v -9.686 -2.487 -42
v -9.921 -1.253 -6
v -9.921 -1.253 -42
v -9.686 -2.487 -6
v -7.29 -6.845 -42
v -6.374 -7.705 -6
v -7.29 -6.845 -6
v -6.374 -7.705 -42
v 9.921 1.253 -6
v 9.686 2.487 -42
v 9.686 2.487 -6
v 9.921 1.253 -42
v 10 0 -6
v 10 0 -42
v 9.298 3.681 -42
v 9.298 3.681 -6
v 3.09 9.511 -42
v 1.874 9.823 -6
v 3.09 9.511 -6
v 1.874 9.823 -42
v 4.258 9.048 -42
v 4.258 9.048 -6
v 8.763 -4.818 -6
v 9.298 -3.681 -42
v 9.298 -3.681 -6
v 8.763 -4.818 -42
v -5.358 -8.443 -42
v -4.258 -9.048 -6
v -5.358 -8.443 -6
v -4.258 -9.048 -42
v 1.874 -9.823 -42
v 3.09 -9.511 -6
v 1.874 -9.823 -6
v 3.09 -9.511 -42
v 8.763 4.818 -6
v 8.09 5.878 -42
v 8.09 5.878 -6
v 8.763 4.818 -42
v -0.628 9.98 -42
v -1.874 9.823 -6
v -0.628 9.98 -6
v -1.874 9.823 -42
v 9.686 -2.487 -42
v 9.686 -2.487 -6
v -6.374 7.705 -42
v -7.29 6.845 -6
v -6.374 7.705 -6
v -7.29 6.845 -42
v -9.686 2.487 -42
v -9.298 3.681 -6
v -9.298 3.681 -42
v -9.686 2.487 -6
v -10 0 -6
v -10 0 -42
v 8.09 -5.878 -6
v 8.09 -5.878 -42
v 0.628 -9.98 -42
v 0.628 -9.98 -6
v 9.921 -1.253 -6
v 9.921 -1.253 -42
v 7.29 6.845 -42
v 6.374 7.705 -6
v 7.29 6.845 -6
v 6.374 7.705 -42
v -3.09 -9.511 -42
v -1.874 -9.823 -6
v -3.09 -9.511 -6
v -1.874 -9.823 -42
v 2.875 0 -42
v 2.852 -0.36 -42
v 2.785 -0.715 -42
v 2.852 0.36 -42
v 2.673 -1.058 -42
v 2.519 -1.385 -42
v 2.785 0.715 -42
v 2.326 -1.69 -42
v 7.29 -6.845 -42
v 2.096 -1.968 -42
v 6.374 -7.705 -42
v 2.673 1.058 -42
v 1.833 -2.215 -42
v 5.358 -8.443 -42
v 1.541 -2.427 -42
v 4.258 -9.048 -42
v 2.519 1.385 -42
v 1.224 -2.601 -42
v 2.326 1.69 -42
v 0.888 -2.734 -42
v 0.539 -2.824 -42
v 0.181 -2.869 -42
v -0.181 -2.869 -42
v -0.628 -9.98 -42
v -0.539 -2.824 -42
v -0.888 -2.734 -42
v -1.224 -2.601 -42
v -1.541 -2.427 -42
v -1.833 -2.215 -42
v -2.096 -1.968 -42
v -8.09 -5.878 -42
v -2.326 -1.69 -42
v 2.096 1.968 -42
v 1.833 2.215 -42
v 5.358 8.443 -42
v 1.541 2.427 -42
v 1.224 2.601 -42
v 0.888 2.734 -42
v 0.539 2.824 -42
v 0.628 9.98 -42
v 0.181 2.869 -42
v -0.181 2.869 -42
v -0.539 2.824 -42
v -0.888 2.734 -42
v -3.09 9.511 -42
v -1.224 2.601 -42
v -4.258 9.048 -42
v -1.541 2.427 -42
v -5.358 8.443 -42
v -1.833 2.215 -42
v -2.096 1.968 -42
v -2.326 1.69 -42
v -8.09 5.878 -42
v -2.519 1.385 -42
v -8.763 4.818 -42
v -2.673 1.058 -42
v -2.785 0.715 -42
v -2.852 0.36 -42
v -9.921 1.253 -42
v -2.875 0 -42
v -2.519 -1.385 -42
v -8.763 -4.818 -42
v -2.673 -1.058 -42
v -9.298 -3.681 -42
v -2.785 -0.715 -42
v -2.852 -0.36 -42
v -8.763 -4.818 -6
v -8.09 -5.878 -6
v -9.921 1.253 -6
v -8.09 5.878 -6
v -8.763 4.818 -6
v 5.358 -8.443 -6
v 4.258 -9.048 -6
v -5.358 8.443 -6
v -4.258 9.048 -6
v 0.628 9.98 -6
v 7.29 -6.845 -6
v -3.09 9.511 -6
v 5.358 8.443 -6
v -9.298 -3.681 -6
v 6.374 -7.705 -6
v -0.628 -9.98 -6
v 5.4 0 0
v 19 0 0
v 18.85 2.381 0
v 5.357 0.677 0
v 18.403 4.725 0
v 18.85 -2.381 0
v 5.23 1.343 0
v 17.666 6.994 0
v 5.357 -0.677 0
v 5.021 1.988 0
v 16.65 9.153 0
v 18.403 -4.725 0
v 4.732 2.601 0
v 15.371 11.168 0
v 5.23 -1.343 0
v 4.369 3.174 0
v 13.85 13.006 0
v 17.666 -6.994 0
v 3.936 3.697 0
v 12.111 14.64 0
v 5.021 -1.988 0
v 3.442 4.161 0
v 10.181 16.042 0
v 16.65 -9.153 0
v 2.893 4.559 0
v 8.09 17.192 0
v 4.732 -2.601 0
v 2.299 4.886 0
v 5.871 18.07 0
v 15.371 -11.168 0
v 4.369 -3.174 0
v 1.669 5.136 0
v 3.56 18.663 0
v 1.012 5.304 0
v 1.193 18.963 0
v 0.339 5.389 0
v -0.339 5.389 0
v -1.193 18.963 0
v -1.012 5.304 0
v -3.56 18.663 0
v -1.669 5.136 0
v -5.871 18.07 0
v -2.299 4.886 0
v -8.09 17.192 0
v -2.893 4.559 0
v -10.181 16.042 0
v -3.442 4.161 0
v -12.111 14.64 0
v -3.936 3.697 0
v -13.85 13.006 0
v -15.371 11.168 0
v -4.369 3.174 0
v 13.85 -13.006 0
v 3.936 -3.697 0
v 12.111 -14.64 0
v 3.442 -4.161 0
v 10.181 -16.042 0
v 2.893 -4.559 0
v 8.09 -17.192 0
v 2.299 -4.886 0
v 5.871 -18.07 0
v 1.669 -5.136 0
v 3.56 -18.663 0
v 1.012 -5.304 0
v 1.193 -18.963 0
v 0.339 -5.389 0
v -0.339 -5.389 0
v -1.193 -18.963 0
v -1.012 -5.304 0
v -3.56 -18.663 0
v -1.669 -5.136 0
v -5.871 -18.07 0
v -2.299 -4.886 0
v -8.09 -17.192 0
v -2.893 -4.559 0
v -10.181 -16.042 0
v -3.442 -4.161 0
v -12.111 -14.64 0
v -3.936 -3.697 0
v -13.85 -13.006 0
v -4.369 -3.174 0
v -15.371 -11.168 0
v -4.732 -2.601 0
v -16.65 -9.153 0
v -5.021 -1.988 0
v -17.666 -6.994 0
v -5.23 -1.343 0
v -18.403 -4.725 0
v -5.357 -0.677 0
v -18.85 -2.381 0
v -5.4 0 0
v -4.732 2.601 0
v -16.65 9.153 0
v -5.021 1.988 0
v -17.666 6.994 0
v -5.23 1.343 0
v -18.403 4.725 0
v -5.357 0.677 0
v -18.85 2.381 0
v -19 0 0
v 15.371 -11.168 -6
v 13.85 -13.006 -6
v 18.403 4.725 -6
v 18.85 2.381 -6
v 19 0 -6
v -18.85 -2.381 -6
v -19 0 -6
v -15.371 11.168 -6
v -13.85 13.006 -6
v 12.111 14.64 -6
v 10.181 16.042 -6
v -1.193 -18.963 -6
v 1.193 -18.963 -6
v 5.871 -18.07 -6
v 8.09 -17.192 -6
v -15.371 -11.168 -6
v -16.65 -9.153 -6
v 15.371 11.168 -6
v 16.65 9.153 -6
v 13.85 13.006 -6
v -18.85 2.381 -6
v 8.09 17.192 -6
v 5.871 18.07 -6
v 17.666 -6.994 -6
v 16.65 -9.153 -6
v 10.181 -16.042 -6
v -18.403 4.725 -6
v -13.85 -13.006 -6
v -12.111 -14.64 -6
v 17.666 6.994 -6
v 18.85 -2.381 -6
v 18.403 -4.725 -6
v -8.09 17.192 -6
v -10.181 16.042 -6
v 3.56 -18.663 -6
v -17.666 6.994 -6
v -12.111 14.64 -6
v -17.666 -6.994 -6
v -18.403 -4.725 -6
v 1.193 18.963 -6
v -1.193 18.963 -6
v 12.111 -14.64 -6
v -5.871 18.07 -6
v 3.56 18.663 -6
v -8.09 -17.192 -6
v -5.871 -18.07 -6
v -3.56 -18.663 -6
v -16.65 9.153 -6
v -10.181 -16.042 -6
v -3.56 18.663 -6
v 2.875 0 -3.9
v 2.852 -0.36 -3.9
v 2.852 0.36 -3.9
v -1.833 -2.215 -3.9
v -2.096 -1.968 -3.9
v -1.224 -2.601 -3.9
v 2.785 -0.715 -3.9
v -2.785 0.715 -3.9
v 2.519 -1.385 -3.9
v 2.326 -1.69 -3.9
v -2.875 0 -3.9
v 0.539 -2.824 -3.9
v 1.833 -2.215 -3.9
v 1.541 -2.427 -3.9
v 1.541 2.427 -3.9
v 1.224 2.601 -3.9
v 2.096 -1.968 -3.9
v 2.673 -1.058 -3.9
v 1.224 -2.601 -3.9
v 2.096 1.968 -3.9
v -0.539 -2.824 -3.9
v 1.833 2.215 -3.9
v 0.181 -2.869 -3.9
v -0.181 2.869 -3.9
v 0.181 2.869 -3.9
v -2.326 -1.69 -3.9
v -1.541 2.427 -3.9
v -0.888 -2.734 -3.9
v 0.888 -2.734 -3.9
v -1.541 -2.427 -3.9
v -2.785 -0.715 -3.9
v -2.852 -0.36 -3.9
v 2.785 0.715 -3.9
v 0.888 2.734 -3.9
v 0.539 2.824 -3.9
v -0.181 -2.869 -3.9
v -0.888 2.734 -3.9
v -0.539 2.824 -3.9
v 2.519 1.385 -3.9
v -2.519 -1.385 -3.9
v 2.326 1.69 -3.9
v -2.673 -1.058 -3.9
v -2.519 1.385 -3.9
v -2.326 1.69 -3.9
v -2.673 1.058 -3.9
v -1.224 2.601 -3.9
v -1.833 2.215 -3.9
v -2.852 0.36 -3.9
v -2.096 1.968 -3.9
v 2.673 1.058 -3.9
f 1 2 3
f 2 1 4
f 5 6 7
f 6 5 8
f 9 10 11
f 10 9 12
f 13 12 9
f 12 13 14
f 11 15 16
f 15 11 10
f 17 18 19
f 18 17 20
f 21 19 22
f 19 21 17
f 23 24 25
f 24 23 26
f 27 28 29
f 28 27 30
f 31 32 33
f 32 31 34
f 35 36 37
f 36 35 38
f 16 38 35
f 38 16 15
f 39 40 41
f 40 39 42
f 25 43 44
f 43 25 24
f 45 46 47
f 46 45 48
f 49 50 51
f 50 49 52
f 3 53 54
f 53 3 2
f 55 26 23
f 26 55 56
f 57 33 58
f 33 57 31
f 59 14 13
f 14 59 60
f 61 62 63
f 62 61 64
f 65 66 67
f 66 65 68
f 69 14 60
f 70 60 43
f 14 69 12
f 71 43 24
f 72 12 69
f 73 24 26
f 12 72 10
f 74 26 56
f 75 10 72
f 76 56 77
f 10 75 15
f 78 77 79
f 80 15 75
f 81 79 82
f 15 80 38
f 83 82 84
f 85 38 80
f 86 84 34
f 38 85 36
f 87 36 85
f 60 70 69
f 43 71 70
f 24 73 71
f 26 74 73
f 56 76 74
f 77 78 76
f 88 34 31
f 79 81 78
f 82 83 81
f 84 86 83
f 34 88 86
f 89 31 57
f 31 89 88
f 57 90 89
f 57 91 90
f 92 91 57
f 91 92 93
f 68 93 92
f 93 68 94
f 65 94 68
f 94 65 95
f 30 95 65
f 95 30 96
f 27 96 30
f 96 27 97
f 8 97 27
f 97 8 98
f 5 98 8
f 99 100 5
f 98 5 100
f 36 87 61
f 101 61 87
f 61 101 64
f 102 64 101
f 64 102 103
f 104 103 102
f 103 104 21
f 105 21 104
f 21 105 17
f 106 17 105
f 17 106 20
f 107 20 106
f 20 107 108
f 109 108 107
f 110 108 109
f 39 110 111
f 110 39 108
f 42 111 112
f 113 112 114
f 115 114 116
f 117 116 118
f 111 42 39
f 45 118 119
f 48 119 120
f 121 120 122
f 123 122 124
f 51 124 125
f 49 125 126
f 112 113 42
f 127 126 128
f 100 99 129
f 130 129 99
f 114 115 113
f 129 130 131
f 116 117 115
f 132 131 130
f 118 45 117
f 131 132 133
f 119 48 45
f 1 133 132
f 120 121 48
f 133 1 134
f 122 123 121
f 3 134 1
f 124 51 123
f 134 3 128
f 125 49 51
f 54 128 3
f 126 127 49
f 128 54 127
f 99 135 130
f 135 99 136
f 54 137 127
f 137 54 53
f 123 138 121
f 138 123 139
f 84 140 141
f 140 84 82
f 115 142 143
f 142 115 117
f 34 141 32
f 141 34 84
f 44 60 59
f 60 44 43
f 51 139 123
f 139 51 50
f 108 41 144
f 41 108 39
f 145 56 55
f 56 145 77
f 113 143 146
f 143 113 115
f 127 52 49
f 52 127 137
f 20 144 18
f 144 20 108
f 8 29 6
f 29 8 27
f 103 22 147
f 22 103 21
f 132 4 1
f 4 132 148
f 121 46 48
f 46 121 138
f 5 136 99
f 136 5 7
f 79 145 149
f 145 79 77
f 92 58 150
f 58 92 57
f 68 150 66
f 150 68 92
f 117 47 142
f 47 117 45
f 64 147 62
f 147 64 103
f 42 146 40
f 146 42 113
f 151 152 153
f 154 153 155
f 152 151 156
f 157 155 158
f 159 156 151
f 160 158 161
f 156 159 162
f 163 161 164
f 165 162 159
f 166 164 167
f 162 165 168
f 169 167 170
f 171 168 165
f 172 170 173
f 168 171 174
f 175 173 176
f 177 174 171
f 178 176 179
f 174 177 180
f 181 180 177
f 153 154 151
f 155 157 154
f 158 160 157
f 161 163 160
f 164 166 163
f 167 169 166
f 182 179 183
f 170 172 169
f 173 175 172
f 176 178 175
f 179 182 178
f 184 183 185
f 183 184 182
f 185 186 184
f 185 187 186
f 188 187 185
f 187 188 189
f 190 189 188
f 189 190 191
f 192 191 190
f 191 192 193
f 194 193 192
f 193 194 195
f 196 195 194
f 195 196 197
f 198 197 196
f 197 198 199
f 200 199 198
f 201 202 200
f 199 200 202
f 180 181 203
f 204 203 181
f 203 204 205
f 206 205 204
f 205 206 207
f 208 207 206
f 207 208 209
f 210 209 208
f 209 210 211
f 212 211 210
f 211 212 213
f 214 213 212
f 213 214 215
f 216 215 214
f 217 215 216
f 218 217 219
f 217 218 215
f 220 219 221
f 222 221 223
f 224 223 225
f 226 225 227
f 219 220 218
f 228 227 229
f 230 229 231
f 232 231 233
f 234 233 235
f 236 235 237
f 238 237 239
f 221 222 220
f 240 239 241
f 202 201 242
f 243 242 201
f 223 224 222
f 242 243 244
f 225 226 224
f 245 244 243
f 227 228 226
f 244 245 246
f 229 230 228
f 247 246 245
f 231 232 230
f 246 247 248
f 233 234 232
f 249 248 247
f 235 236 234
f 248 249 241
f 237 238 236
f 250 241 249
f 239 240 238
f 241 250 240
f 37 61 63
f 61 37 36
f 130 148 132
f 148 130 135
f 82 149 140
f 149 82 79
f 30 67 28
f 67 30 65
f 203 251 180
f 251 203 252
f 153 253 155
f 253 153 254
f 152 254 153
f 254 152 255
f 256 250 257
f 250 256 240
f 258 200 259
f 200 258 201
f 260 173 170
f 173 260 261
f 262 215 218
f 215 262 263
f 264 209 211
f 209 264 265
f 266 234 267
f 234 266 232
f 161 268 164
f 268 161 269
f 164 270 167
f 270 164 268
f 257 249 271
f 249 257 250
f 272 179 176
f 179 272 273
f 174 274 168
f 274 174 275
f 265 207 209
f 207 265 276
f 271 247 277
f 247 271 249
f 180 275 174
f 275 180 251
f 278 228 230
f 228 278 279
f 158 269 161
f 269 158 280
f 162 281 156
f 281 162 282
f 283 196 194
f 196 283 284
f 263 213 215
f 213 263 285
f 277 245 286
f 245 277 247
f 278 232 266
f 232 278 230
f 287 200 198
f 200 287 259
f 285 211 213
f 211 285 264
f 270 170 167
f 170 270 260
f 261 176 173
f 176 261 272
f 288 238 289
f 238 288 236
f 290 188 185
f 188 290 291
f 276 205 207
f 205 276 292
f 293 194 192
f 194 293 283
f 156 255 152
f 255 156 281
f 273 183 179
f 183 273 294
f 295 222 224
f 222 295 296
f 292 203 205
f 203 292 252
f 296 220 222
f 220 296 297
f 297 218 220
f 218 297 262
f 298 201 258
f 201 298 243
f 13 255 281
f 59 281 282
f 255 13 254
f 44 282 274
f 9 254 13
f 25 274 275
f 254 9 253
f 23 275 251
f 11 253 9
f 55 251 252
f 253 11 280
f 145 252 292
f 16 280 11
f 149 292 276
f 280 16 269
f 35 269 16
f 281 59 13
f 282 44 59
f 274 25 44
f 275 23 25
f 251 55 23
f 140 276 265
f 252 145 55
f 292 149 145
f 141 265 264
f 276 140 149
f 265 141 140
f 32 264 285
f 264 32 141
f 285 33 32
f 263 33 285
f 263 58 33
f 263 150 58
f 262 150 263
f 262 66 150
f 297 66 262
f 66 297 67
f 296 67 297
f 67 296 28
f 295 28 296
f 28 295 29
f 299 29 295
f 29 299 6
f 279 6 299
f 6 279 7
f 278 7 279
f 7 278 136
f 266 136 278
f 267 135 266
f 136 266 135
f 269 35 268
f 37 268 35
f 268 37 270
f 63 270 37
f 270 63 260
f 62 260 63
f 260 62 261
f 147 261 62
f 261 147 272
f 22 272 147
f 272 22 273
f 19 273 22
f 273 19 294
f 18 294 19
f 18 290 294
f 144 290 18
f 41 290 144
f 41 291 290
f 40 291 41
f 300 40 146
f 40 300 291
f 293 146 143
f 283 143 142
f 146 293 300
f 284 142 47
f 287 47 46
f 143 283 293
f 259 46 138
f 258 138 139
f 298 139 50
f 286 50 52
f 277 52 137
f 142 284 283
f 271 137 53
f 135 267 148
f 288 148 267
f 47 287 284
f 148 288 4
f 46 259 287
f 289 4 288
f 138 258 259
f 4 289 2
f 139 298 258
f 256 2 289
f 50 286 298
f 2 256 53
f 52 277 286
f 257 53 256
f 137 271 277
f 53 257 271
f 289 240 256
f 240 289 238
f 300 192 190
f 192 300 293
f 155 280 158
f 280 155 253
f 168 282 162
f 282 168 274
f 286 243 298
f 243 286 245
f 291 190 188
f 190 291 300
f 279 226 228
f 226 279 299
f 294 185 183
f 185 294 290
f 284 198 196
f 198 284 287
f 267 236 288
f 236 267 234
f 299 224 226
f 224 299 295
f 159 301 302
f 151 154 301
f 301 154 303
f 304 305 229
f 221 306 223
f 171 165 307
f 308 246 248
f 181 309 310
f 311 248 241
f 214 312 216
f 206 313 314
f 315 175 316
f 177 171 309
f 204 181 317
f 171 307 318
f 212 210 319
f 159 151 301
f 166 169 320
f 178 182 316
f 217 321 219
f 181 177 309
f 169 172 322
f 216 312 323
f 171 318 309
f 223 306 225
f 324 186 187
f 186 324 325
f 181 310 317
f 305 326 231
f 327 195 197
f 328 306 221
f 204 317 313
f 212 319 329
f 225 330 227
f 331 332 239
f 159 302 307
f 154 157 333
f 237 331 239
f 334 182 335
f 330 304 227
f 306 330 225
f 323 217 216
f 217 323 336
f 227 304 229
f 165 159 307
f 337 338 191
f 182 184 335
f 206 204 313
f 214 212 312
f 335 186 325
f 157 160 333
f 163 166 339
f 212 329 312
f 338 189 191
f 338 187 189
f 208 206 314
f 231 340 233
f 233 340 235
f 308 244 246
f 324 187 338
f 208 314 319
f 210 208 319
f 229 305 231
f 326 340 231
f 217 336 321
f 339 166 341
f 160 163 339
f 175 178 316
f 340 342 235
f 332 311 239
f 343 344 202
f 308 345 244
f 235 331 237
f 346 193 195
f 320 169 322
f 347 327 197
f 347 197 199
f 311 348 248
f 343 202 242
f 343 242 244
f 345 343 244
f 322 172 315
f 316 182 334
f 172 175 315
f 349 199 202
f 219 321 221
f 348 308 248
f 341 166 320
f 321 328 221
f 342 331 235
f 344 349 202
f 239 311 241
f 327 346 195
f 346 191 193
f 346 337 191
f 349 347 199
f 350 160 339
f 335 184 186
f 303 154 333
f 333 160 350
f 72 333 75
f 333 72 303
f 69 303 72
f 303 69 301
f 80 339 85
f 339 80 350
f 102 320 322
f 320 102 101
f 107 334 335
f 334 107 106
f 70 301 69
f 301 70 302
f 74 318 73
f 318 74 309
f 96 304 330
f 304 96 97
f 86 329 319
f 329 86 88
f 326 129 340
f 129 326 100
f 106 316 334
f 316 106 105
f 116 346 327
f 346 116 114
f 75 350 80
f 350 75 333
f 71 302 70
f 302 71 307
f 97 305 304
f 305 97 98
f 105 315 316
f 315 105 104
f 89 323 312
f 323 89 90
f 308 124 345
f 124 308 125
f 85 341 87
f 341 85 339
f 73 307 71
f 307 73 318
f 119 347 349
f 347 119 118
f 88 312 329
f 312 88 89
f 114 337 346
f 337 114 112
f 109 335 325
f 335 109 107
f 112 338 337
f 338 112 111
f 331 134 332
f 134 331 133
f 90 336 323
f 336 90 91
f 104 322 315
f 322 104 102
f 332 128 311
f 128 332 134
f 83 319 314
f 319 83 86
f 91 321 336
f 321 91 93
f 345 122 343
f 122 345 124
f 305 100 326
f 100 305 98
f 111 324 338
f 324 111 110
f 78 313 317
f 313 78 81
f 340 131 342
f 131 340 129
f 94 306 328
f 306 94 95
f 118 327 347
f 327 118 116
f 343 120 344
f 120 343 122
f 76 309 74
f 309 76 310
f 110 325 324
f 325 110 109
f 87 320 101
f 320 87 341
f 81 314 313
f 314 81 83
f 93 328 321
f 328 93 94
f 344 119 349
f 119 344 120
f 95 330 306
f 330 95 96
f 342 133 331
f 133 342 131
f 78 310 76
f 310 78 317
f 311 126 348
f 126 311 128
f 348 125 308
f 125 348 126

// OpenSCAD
$fn = 50;


difference() {
	union() {
		translate(v = [0, 0, -42.0000000000]) {
			cylinder(h = 42, r = 10.0000000000);
		}
		translate(v = [0, 0, -6.0000000000]) {
			cylinder(h = 6, r = 19.0000000000);
		}
	}
	union() {
		translate(v = [0, 0, 0]) {
			rotate(a = [0, 0, 0]) {
				difference() {
					union() {
						#translate(v = [0, 0, -42.0000000000]) {
							cylinder(h = 42, r = 2.6000000000);
						}
						#translate(v = [0, 0, -3.9000000000]) {
							cylinder(h = 3.9000000000, r = 10.0000000000, r1 = 2.8750000000, r2 = 5.4000000000);
						}
						#translate(v = [0, 0, -42.0000000000]) {
							cylinder(h = 42, r = 2.8750000000);
						}
						#translate(v = [0, 0, -42.0000000000]) {
							cylinder(h = 42, r = 2.6000000000);
						}
					}
					union();
				}
			}
		}
	}
}
